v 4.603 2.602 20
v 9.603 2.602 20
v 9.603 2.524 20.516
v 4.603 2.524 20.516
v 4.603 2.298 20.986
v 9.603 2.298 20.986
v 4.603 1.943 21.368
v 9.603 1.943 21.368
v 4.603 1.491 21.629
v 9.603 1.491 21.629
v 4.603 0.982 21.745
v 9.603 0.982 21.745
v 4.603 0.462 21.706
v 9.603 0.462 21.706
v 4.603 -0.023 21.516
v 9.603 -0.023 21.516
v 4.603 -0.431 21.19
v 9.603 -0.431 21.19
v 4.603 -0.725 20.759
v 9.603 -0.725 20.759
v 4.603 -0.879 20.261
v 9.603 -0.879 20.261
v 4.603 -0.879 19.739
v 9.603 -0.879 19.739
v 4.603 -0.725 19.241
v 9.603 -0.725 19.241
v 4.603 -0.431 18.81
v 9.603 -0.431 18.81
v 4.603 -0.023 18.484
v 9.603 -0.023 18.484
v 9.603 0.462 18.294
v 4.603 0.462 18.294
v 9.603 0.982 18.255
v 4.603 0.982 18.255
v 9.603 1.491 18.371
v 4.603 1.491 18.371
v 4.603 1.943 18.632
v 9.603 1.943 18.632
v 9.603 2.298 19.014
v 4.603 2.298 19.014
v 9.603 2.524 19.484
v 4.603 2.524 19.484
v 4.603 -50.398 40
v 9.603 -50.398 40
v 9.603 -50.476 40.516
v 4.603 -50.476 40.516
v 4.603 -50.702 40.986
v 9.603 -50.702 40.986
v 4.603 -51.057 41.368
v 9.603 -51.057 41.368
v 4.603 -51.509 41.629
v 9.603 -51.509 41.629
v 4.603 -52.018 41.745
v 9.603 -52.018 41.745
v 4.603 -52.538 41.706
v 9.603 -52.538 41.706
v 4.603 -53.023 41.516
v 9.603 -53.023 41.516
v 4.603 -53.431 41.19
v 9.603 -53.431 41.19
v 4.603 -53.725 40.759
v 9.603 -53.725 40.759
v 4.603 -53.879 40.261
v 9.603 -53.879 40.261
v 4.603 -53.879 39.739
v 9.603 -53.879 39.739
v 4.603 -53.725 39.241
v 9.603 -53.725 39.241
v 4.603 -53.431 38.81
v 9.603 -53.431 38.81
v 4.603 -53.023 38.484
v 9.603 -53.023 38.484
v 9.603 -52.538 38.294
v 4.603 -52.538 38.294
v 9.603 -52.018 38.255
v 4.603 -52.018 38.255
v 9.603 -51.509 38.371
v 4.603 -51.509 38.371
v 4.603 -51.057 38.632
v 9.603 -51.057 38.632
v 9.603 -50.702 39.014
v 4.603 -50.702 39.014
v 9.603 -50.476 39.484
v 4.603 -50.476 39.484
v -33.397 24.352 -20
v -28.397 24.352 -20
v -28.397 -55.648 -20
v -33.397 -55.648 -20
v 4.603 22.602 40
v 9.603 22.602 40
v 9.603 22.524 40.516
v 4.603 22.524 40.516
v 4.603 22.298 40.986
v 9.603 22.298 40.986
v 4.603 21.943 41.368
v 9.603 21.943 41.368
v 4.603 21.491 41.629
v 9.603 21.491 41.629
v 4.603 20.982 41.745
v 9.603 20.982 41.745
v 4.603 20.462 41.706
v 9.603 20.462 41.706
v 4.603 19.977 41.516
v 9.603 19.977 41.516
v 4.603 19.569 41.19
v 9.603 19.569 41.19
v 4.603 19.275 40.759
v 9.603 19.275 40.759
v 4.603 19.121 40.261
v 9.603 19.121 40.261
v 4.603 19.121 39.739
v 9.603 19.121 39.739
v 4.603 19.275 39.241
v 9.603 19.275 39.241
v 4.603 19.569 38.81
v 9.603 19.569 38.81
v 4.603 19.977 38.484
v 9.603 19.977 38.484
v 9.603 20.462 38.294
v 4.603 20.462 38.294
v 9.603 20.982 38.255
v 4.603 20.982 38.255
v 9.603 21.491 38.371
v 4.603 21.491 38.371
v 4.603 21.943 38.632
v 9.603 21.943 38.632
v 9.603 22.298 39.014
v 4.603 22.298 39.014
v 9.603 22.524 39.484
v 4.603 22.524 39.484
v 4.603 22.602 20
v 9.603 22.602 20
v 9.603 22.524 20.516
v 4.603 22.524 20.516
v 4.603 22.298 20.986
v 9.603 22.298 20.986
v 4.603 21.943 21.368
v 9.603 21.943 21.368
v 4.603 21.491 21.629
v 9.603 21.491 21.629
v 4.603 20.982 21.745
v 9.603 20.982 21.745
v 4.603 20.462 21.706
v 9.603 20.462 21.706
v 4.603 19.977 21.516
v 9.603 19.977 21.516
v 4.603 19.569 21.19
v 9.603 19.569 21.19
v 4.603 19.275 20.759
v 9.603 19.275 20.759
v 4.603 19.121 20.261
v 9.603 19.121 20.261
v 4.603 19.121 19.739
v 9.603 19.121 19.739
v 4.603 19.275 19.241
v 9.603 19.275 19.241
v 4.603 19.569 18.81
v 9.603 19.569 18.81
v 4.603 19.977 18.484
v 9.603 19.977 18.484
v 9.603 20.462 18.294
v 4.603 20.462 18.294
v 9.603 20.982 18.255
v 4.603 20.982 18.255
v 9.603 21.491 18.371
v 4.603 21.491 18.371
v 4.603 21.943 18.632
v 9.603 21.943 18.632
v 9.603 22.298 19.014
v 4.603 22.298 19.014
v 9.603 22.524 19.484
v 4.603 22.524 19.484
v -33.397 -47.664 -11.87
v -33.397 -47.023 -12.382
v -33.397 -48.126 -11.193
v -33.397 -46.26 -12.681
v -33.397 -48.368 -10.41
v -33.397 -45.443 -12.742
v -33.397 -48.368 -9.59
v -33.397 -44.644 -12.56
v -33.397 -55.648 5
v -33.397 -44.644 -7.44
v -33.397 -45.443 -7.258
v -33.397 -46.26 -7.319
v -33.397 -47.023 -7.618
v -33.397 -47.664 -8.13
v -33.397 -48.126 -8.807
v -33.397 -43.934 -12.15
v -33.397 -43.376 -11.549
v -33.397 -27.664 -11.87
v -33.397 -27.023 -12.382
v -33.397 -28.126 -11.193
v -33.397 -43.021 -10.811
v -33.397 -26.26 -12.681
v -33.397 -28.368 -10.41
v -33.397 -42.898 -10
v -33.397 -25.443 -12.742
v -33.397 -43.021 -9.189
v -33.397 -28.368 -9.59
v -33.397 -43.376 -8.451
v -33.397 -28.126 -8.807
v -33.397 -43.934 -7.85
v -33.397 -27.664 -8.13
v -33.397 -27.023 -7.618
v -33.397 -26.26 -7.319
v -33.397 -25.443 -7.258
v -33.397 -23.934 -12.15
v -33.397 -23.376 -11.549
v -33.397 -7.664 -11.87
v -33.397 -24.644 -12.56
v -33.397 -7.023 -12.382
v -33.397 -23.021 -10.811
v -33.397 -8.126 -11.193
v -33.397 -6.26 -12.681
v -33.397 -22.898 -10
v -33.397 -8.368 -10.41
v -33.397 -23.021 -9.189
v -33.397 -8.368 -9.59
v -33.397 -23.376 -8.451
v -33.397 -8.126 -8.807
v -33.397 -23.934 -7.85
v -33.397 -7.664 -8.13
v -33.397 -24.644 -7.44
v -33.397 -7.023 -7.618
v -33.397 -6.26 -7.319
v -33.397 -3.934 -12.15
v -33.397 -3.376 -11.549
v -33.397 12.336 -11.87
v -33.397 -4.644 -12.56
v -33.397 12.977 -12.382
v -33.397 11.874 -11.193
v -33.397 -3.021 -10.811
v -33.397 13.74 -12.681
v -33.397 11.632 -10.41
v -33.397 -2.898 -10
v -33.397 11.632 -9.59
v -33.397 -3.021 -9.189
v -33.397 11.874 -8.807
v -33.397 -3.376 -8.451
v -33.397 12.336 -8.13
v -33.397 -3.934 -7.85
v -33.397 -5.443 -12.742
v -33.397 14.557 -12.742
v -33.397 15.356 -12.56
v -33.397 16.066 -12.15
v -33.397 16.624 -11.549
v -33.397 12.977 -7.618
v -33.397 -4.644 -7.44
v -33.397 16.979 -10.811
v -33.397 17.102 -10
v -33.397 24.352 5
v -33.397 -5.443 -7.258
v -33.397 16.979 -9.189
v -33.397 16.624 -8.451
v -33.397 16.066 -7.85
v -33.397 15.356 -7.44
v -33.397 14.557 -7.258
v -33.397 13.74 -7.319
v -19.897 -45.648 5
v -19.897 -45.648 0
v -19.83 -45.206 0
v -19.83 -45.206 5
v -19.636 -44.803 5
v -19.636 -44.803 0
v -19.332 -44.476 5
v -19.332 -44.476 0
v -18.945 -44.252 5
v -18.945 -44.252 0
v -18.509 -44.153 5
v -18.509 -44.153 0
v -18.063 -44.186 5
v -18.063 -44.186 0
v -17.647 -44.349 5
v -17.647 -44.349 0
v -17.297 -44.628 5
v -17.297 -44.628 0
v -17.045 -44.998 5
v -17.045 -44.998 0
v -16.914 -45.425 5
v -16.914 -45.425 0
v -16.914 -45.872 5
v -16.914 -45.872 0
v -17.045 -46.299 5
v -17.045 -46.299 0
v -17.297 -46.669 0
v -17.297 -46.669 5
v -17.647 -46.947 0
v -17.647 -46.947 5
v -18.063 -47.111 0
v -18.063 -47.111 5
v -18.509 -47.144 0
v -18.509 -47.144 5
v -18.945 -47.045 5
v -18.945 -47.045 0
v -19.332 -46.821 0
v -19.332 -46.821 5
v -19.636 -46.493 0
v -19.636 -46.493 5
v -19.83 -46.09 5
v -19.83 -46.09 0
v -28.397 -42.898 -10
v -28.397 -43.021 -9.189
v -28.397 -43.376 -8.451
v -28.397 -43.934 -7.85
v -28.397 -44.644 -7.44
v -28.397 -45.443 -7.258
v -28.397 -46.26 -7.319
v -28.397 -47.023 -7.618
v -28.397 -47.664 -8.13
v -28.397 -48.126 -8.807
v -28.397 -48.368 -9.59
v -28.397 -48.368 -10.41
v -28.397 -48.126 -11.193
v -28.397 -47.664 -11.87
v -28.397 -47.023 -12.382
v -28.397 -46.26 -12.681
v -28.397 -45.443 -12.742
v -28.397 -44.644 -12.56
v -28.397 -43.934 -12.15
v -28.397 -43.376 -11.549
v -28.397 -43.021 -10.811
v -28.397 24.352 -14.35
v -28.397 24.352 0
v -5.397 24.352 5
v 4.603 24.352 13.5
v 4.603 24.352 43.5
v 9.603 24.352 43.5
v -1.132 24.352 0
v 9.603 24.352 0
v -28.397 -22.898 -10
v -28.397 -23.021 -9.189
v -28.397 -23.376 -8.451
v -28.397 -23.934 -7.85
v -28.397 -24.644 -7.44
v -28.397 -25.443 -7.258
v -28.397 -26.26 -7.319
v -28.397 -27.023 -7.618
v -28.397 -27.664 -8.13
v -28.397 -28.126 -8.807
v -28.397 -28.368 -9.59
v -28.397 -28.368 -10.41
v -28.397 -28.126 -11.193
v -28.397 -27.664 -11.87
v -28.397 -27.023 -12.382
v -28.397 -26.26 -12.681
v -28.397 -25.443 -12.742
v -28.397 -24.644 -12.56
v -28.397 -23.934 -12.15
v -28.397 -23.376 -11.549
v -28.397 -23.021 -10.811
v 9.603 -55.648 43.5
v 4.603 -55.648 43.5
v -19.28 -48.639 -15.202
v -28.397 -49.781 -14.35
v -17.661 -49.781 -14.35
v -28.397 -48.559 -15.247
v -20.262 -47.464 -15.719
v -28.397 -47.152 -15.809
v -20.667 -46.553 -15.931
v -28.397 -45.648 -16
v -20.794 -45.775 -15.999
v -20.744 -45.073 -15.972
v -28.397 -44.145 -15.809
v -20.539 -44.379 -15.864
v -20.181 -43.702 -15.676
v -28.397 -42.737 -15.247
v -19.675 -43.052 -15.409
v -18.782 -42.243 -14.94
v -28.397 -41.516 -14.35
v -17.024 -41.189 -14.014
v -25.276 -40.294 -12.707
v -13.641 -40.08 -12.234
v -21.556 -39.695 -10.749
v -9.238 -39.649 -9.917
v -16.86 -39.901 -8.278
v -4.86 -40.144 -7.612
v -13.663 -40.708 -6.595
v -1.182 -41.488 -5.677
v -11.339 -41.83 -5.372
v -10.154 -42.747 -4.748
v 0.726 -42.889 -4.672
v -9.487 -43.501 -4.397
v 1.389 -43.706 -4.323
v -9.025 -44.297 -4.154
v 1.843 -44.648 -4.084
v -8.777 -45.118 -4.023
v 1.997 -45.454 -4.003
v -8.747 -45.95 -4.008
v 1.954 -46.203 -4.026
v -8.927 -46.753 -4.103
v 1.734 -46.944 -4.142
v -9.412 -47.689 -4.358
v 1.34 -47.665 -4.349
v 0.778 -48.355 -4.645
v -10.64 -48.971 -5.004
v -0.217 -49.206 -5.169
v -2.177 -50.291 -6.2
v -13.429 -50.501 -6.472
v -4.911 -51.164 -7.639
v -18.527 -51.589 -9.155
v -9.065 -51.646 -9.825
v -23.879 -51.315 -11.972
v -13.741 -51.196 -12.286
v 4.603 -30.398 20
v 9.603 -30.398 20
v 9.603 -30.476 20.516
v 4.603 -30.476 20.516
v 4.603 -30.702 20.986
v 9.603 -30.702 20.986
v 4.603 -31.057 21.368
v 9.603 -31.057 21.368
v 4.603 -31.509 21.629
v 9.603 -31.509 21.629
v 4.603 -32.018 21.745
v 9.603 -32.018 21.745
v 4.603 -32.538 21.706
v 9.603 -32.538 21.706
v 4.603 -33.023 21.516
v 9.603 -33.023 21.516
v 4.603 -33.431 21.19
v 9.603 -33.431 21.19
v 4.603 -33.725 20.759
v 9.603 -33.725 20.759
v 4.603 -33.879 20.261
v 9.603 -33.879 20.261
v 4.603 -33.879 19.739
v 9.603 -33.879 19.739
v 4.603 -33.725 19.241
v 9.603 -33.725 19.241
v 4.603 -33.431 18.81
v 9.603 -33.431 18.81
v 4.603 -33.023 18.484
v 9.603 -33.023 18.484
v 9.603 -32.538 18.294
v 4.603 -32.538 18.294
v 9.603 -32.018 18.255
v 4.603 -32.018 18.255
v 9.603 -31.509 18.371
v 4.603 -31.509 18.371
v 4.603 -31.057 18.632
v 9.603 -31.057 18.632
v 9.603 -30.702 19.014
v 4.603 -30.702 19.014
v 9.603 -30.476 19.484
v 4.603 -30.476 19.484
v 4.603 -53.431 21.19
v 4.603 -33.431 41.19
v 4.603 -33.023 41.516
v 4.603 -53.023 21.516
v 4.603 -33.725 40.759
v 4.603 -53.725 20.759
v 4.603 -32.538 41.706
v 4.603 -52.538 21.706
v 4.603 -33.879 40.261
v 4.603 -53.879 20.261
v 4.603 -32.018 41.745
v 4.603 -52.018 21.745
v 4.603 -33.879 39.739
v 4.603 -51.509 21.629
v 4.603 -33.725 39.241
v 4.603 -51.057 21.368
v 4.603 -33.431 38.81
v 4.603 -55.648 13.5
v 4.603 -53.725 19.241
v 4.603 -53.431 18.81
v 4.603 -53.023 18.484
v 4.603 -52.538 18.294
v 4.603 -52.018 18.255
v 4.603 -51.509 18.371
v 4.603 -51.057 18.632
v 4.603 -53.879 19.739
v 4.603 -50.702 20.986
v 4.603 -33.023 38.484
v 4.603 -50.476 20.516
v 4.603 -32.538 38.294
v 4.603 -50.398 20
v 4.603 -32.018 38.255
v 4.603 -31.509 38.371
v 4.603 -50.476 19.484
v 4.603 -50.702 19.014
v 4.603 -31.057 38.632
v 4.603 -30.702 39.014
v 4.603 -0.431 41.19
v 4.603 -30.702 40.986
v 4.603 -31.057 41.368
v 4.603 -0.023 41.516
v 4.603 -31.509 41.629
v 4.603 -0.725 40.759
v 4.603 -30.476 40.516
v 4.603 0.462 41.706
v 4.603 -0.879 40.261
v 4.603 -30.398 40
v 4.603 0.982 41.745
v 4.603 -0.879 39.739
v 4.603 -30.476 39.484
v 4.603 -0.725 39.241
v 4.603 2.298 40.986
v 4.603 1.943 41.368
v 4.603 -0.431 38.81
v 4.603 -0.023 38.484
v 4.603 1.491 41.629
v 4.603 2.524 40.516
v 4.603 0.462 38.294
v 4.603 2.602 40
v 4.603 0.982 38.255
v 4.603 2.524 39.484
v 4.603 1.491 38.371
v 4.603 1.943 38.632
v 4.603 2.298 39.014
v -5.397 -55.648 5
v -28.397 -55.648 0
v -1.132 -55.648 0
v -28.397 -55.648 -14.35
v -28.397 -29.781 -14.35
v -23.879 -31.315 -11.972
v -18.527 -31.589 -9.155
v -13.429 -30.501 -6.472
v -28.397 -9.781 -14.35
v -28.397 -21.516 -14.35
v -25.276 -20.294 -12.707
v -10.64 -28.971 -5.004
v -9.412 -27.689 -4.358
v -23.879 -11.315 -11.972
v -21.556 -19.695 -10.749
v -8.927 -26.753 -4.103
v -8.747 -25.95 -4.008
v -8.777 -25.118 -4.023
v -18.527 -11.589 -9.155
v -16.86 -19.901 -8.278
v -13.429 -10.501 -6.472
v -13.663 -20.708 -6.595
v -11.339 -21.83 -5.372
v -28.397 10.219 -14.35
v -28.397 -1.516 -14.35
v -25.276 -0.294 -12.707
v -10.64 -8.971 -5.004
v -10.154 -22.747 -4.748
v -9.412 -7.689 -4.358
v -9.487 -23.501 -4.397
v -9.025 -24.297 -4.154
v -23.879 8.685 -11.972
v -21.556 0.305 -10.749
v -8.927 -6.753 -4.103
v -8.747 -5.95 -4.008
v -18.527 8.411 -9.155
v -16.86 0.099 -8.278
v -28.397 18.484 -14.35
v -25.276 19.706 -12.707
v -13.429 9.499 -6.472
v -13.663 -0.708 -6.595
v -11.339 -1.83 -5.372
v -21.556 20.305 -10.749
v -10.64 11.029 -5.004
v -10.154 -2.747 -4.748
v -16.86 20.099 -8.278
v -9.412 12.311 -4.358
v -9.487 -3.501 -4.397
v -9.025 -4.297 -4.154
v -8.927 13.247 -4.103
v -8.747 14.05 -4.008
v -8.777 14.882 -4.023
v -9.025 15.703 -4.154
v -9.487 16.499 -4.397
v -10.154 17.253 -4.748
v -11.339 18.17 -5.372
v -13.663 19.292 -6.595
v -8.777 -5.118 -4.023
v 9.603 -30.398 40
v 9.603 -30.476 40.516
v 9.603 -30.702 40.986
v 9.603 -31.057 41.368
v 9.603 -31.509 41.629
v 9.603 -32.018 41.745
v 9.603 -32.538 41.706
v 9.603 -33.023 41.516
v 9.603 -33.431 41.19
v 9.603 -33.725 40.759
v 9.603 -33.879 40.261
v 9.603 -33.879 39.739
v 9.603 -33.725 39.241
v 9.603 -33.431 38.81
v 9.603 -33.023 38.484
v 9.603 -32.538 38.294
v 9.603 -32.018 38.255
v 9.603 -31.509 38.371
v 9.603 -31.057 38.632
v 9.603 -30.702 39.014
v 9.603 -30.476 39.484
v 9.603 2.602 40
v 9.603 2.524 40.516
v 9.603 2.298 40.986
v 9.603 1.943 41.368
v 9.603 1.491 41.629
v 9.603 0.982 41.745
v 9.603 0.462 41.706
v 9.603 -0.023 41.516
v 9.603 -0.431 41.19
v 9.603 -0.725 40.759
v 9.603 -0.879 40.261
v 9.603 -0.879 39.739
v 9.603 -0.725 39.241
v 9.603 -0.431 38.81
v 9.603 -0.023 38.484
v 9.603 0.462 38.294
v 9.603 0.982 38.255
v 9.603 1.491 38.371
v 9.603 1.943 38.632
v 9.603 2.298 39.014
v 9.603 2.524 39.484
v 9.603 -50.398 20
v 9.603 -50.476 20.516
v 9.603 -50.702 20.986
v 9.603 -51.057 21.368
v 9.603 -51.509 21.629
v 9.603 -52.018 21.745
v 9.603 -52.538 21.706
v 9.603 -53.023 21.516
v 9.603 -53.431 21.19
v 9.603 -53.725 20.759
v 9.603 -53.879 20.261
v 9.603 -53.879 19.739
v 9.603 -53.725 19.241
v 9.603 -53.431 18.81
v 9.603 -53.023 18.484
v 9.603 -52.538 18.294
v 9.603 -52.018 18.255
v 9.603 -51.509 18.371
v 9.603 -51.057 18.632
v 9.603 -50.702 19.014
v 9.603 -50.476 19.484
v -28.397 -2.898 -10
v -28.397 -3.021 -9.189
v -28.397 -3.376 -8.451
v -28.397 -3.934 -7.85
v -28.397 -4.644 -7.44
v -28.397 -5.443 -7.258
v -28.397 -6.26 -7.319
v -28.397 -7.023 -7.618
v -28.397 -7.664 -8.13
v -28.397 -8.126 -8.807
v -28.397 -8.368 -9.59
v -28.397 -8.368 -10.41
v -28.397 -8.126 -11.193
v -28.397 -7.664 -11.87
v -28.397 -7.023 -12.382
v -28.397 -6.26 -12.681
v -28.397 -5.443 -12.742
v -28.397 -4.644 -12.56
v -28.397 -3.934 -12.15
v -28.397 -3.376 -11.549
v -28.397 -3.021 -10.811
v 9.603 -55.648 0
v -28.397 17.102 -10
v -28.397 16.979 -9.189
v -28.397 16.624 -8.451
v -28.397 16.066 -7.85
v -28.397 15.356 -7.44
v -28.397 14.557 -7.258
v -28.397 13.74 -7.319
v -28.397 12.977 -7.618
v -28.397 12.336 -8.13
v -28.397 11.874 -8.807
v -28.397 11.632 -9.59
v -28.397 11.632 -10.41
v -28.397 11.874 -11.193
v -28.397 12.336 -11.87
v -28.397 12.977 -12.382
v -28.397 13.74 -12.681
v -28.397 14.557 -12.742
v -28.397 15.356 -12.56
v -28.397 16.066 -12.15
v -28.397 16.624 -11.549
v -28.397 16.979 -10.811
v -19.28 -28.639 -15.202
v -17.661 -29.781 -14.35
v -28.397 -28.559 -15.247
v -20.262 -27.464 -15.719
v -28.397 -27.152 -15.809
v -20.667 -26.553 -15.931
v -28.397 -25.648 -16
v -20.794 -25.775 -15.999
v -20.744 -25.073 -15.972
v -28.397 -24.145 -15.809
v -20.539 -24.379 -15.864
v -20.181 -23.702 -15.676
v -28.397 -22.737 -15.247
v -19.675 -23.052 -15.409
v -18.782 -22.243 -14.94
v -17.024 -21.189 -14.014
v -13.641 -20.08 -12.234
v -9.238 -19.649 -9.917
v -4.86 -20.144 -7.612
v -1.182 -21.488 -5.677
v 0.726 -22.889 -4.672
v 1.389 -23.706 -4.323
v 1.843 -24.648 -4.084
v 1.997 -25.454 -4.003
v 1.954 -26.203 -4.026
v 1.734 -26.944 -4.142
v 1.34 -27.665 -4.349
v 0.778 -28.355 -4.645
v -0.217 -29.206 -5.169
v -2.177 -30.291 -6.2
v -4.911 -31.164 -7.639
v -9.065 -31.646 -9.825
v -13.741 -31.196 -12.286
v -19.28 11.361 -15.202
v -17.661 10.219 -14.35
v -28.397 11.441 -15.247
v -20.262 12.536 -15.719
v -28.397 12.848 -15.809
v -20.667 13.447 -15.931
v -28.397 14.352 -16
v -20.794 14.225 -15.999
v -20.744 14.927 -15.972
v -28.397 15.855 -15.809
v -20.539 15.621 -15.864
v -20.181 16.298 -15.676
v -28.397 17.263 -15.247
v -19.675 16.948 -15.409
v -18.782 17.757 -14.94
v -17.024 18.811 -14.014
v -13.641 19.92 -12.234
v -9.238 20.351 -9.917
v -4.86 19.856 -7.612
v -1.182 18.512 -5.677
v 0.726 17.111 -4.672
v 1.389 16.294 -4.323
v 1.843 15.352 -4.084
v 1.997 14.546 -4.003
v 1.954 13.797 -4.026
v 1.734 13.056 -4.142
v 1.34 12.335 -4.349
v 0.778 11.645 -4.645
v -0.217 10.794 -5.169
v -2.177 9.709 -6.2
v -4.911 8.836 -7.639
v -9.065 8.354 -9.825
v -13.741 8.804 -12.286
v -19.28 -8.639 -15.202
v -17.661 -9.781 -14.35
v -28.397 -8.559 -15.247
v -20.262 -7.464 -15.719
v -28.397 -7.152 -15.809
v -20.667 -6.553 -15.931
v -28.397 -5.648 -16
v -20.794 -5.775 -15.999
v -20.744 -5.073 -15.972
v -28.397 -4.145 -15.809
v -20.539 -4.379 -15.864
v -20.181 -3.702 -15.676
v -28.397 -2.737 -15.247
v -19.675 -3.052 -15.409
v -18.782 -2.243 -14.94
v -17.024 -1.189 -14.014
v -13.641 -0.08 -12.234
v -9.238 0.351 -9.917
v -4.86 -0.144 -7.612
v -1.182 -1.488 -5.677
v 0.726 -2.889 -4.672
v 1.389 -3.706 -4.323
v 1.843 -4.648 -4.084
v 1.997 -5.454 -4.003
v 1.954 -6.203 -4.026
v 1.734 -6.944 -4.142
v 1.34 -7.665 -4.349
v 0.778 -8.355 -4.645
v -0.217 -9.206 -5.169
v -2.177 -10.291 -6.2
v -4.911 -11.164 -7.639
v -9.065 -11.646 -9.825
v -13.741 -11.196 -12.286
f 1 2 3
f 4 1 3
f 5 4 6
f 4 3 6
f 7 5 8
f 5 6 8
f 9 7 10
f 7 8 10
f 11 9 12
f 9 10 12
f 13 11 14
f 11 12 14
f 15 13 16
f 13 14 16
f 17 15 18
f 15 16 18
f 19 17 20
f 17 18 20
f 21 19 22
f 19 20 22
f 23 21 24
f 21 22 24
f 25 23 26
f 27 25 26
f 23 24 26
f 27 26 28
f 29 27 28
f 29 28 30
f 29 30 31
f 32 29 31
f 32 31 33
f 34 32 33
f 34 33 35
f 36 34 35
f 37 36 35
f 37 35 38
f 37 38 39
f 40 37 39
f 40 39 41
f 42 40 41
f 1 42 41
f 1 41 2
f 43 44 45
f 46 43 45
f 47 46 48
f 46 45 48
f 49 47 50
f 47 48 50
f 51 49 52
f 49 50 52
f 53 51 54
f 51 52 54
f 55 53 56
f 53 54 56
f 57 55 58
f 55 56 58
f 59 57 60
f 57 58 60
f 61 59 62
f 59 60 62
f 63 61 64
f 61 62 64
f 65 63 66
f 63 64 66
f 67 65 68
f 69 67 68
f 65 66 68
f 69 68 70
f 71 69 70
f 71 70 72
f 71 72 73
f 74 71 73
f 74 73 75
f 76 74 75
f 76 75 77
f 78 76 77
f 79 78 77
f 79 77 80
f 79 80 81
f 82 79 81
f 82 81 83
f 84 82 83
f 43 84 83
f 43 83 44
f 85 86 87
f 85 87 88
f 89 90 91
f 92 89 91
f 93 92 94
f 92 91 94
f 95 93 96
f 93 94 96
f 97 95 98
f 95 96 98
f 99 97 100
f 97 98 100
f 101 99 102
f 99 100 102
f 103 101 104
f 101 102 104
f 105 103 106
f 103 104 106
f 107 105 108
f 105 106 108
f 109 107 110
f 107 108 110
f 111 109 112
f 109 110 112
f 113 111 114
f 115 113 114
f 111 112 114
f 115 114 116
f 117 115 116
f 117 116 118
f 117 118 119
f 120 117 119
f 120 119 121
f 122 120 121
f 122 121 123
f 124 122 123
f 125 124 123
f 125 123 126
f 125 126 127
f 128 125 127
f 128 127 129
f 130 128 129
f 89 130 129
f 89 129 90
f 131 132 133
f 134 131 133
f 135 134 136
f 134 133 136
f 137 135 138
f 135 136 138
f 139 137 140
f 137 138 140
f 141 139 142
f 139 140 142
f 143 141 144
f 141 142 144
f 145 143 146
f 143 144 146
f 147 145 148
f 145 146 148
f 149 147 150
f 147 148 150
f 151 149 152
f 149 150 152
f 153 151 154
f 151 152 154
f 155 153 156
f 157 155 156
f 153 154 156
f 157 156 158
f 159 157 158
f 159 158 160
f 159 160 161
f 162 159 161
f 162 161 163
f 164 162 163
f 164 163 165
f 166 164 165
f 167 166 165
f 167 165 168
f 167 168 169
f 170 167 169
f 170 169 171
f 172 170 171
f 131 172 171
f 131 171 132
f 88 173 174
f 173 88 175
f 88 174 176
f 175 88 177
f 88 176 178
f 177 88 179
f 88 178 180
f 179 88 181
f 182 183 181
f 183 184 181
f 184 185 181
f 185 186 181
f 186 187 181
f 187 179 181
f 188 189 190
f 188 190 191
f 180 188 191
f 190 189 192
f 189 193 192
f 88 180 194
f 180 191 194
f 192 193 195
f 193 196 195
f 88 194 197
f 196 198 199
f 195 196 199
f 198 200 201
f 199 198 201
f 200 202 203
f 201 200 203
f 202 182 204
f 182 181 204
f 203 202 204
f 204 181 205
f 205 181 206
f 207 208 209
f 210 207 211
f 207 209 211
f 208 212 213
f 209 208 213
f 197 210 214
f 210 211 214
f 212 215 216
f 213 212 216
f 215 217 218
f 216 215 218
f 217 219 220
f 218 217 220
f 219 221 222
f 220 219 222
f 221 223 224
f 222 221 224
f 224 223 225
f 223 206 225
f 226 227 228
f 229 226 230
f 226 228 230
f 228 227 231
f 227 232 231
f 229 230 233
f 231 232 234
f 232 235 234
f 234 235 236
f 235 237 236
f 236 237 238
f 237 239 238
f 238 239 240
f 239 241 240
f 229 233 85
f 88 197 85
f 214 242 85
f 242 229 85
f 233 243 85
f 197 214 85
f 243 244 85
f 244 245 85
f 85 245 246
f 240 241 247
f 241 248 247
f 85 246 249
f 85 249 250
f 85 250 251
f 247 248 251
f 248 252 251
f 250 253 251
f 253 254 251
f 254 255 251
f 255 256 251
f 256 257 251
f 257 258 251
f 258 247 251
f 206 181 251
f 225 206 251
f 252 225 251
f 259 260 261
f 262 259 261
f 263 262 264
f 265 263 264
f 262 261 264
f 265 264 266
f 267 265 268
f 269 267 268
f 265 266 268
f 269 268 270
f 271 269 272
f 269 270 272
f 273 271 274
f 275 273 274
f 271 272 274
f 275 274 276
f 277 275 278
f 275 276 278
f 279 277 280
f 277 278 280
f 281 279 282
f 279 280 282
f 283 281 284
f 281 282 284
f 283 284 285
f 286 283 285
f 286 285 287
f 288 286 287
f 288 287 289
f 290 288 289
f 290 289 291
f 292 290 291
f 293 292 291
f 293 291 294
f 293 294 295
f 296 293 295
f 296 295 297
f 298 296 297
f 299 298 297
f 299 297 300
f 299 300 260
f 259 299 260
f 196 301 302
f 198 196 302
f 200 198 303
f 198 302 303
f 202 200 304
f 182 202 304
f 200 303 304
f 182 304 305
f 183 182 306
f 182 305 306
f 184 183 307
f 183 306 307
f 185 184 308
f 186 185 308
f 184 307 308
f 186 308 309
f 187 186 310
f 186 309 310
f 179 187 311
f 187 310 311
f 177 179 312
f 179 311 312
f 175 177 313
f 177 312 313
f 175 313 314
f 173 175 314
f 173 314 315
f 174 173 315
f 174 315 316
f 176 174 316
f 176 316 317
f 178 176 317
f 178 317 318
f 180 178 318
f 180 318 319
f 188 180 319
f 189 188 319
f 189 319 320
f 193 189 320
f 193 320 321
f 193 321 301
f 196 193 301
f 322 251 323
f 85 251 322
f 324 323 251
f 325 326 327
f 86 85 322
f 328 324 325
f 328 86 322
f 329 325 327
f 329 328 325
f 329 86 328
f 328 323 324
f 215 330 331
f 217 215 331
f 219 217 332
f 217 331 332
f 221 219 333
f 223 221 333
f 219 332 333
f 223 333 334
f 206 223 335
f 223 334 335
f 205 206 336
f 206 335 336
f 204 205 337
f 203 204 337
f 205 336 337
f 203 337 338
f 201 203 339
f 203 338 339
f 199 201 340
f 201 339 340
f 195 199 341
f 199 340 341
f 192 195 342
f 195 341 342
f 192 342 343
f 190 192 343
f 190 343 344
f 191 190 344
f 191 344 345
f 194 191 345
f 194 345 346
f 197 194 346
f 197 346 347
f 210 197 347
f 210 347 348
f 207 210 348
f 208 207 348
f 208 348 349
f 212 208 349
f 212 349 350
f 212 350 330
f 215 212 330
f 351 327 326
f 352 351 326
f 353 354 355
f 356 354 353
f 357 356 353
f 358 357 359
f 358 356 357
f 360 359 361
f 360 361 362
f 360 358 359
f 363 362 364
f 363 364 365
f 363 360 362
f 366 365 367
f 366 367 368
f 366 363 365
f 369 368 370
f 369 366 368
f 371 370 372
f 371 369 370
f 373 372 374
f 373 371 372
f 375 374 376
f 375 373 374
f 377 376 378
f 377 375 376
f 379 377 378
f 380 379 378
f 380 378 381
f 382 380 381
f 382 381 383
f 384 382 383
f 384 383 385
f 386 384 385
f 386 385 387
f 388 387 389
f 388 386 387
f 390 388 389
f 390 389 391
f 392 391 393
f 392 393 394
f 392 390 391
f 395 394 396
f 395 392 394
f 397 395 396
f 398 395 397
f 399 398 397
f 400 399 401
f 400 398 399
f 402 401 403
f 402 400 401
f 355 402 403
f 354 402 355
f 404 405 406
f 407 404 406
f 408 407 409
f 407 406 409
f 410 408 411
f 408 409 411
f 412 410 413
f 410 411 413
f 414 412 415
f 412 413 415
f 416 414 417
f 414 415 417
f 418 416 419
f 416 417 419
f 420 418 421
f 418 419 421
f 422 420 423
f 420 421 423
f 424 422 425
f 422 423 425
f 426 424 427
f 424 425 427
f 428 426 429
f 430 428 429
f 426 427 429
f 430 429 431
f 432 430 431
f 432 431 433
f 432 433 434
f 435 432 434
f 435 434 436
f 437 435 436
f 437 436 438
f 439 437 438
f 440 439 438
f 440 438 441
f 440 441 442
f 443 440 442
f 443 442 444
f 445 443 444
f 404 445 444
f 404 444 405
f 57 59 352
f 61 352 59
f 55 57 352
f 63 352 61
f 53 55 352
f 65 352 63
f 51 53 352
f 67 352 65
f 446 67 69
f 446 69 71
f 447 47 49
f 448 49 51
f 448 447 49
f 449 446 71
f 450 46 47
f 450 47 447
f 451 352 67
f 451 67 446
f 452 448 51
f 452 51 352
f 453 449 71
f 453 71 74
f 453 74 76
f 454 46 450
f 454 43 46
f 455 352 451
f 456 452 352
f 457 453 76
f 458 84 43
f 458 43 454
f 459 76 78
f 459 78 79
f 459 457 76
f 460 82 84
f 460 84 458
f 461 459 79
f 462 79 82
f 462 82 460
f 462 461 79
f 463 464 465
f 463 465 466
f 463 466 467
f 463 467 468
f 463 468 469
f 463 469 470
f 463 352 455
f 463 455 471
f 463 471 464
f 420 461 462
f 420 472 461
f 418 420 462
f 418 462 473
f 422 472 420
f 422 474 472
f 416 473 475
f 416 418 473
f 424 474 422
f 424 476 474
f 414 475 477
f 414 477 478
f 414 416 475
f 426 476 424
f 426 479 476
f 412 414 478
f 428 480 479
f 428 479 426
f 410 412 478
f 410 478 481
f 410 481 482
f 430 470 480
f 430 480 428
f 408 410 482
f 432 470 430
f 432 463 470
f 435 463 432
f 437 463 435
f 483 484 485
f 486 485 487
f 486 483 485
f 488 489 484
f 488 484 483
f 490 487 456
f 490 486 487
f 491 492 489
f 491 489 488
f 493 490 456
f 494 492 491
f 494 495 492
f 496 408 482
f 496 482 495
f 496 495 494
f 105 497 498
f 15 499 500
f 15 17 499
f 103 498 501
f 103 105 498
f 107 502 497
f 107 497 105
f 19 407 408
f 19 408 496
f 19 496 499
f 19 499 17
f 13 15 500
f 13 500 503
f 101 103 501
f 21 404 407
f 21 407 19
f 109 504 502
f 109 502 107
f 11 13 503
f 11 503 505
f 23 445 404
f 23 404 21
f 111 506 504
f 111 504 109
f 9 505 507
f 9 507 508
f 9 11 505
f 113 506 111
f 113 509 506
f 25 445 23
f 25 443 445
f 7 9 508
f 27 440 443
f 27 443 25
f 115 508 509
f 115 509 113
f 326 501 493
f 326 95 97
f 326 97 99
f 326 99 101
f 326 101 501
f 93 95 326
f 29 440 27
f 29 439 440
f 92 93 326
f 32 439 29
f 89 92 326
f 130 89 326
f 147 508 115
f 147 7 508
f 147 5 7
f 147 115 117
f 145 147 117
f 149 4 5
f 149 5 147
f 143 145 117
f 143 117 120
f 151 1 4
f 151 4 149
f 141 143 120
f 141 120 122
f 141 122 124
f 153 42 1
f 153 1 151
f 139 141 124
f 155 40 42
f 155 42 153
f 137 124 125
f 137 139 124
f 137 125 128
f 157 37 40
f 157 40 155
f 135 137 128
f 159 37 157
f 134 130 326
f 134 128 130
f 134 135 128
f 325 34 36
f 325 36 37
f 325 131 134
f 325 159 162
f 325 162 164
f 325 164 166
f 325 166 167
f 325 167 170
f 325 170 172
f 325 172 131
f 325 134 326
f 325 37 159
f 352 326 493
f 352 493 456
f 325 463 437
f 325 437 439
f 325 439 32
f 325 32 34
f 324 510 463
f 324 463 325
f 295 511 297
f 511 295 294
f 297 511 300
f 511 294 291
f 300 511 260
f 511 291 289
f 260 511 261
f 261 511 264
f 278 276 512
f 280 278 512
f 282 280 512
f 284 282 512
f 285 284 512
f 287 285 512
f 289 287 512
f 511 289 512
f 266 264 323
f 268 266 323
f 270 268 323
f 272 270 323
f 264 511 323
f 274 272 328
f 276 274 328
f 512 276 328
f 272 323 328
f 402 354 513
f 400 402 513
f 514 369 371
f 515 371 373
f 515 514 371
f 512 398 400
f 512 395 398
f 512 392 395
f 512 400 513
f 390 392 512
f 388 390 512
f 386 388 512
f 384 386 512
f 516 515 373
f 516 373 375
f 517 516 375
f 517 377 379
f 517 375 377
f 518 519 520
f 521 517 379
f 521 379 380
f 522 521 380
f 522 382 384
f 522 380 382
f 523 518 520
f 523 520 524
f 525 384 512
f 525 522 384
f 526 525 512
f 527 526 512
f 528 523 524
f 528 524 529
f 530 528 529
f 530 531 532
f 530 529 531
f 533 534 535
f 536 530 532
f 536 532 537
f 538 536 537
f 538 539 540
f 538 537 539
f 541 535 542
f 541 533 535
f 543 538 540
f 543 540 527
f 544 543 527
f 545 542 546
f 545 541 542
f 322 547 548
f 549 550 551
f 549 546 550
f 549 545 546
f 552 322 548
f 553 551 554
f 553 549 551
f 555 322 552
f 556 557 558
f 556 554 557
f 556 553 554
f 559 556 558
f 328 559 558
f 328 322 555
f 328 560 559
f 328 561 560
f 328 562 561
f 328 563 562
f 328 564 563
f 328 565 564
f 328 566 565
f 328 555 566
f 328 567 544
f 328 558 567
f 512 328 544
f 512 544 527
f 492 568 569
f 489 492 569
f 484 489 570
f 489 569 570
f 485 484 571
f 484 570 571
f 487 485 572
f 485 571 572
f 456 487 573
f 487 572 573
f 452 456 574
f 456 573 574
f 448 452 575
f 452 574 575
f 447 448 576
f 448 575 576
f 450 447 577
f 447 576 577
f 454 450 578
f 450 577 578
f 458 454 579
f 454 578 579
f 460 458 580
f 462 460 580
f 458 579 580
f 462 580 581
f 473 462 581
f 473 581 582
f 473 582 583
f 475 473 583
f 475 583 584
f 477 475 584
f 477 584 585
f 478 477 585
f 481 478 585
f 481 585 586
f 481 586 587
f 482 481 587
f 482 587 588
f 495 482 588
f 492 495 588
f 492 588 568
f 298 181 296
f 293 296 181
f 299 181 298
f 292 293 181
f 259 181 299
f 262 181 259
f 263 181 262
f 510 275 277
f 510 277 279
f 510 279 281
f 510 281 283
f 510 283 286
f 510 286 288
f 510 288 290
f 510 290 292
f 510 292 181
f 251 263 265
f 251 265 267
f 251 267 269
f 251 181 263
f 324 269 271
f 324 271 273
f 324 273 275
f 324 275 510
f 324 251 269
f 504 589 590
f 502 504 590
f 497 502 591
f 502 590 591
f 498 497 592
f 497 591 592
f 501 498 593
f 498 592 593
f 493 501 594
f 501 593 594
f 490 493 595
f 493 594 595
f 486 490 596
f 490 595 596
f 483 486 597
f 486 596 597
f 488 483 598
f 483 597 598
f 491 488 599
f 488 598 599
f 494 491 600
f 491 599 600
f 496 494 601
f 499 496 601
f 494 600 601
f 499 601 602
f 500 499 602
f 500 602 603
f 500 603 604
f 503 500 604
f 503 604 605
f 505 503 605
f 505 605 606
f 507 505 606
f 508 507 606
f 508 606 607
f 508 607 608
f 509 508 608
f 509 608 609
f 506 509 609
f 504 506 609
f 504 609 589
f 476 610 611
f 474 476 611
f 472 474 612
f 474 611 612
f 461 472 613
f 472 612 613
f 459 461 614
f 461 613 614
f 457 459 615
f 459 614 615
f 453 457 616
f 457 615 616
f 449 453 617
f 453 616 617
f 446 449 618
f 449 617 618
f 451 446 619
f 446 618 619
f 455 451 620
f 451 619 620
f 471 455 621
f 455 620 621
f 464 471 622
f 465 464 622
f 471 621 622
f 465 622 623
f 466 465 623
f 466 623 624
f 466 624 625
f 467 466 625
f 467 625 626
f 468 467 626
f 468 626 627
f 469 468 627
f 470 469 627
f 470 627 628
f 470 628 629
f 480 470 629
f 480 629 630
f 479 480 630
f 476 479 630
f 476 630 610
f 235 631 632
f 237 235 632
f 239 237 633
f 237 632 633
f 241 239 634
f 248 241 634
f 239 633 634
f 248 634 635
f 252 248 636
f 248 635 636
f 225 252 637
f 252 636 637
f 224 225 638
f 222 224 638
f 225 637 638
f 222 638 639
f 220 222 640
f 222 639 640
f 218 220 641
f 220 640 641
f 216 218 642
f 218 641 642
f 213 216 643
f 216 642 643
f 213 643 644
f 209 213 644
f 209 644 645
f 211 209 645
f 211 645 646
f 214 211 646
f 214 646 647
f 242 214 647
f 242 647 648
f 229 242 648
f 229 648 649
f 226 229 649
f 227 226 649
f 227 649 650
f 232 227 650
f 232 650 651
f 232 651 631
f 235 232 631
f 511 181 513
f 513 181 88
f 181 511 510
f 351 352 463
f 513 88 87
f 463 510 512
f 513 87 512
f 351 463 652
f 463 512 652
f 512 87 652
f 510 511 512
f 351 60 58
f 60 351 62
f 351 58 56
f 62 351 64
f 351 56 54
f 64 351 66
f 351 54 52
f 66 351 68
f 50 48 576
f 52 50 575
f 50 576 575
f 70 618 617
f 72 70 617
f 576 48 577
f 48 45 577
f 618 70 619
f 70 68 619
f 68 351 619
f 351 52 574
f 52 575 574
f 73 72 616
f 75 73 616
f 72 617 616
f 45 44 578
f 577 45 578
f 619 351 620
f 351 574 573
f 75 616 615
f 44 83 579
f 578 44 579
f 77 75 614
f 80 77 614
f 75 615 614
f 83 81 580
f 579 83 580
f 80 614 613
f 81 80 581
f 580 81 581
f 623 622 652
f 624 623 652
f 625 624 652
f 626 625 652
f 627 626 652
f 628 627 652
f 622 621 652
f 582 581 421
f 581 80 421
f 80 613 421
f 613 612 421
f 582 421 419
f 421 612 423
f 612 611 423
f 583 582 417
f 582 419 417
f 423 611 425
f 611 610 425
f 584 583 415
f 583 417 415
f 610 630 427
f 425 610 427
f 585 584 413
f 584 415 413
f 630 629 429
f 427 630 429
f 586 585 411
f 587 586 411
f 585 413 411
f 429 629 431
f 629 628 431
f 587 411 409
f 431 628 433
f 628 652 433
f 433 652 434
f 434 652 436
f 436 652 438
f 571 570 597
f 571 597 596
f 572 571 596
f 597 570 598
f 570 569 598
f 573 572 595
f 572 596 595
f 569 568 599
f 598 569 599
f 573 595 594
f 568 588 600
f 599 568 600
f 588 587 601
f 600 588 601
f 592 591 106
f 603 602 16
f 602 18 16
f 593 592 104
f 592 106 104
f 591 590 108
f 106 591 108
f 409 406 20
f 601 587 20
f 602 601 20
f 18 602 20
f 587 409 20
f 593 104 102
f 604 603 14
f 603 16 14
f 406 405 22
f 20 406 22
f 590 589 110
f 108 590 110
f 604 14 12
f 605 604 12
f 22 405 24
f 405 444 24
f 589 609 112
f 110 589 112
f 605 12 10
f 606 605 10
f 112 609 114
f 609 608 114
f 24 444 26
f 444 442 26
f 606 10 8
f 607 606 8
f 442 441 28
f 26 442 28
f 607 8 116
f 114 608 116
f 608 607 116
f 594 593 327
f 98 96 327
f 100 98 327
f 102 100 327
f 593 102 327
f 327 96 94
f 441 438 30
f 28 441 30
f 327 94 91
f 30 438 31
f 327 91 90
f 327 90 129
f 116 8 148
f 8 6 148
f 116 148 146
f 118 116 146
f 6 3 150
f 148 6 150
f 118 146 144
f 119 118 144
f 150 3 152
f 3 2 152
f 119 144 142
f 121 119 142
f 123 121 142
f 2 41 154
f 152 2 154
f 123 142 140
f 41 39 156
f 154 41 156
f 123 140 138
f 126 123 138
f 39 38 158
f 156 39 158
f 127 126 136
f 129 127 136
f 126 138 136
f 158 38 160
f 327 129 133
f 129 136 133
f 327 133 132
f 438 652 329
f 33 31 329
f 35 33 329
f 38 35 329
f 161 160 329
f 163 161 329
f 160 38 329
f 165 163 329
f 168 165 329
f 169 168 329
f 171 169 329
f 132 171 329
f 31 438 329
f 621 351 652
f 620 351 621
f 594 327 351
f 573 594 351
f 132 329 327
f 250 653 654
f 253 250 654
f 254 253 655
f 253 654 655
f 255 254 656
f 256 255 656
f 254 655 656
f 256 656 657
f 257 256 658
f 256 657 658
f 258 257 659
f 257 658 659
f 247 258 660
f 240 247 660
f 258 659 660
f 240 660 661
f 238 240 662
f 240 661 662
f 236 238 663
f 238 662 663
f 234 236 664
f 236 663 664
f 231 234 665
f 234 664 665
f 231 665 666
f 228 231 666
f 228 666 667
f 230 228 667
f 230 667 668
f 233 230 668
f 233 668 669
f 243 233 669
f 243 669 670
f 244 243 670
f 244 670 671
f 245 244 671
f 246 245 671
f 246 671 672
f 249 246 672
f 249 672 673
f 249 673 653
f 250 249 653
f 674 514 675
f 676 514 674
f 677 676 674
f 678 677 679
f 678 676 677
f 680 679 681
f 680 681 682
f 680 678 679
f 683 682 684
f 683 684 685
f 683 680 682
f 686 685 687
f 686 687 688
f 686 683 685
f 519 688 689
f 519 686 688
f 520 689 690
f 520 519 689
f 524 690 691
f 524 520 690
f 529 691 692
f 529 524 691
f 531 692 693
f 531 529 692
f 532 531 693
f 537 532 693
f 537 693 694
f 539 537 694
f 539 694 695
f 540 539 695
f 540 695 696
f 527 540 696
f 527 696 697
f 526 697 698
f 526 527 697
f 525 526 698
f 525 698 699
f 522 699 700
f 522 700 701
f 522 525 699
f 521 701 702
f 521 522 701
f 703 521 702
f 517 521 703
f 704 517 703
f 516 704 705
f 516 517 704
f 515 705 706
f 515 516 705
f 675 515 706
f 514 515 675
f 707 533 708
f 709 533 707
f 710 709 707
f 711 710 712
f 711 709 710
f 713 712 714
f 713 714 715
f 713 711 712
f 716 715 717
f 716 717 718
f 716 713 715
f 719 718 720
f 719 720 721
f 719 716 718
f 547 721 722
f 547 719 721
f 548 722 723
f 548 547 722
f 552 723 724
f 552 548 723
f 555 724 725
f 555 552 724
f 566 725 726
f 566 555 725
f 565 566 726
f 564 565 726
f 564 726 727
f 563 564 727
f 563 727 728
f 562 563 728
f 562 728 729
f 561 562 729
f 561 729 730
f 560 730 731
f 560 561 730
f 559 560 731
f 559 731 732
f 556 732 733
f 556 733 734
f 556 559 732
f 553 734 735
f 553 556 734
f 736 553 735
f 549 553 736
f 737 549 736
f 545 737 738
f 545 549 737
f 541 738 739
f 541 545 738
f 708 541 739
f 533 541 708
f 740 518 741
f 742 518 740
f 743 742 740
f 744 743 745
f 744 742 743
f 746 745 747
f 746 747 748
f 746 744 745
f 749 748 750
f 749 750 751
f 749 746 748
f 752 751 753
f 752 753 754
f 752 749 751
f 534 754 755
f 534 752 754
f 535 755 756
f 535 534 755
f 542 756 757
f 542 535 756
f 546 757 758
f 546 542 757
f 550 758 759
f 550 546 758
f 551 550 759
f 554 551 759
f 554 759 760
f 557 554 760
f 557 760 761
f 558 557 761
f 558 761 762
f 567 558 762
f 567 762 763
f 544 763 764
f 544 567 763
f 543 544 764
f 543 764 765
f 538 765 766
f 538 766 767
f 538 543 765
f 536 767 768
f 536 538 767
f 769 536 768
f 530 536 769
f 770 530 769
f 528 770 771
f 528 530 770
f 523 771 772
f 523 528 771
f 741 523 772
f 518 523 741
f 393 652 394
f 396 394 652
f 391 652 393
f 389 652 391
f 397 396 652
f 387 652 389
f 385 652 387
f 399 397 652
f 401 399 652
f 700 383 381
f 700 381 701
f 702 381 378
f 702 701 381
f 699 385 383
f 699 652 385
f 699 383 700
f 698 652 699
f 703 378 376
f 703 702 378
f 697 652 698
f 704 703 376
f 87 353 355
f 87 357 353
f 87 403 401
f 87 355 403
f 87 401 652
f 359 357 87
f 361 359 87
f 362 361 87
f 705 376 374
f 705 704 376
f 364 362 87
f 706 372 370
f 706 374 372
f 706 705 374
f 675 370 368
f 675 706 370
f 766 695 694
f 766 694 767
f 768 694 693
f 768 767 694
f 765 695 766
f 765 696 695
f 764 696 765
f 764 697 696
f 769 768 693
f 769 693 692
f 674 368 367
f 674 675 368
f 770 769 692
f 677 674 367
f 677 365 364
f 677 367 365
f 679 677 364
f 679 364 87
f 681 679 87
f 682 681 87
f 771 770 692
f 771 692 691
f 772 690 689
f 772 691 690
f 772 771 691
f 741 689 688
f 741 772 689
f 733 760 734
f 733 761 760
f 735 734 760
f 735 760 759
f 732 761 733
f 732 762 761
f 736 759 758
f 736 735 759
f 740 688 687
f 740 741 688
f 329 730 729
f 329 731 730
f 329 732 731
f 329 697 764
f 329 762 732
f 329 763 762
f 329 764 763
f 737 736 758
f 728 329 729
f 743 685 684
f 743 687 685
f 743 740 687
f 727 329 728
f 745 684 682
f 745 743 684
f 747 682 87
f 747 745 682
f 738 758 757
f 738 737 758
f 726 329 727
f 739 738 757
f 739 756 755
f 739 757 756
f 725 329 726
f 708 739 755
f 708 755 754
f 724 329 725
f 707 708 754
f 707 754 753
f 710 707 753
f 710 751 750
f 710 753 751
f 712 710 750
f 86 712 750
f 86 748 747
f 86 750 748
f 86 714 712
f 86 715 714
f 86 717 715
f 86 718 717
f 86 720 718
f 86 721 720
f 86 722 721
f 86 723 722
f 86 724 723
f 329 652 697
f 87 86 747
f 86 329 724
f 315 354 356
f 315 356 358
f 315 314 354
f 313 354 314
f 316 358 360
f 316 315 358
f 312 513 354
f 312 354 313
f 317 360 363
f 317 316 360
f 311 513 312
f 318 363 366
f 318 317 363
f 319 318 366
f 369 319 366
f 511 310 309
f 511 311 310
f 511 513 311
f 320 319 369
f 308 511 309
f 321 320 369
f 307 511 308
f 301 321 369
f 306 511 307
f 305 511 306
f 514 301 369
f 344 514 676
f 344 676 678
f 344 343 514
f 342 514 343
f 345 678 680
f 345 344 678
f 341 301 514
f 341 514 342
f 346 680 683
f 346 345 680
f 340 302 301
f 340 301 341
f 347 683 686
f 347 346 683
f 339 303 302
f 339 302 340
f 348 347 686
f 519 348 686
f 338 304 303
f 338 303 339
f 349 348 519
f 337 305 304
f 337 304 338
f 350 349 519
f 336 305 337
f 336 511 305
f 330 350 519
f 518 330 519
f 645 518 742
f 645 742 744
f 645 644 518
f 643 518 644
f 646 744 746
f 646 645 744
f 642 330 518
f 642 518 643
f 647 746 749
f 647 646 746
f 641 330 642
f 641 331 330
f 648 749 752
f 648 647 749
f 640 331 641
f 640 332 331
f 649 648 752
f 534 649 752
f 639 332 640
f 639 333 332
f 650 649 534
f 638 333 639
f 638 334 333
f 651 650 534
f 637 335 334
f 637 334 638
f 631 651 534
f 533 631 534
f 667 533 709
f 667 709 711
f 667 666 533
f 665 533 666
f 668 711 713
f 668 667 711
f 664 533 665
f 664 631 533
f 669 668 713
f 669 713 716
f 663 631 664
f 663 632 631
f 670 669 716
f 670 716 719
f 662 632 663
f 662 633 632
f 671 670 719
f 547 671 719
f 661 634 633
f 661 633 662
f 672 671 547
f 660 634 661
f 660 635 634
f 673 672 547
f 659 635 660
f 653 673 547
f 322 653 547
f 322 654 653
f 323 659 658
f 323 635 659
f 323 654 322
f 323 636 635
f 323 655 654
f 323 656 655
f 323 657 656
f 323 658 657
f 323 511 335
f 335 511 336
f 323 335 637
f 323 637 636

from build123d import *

# Parameters (mm, degrees)
ESQUISSE1_W             = 43
ESQUISSE1_H             = 80
BOSS_EXTRU_1_DEPTH      = 5
ESQUISSE2_W             = 5
ESQUISSE2_H             = 80
BOSS_EXTRU_2_DEPTH      = 38.5
ENL_V_MAT_EXTRU_1_REACH = 84.692
ESQUISSE3_R             = 1.75
ESQUISSE4_W             = 5
ESQUISSE4_H             = 80
BOSS_EXTRU_3_DEPTH      = 20
ENL_V_MAT_EXTRU_2_REACH = 82.206
ESQUISSE5_R             = 2.75
ENL_V_MAT_EXTRU_3_REACH = 80.13
ESQUISSE6_R             = 1.5
BOSS_EXTRU_4_DEPTH      = 80
ENL_V_MAT_EXTRU_4_REACH = 82.206
ESQUISSE8_R             = 6
CHANFREIN2_SIZE         = 8.5
CHANFREIN2_SIZE2        = 10


with BuildPart() as part:
    # Esquisse1 → Boss.-Extru.1 (new body)
    with BuildSketch(Plane.XY):
        with Locations((-11.896872358, -15.648351648)):
            Rectangle(ESQUISSE1_W, ESQUISSE1_H)
    extrude(amount=BOSS_EXTRU_1_DEPTH)

    # Esquisse2 → Boss.-Extru.2 (add)
    with BuildSketch(Plane(origin=(0, 0, 5), x_dir=(-1, 0, 0), z_dir=(0, 0, -1))):
        with Locations((-7.103127642, -15.648351648)):
            Rectangle(ESQUISSE2_W, ESQUISSE2_H)
    extrude(amount=-BOSS_EXTRU_2_DEPTH)

    # Esquisse3 → Enlèv. mat.-Extru.1 (cut, up to next)
    with BuildSketch(Plane(origin=(9.603127642, 0, 0), x_dir=(0, 0, -1), z_dir=(1, 0, 0)), mode=Mode.PRIVATE) as enl_v_mat_extru_1_sk1:
        with Locations(Location((-40, -52.148351648, 0), (0, 0, 90))):
            Circle(ESQUISSE3_R)
    enl_v_mat_extru_1_tool1 = extrude(enl_v_mat_extru_1_sk1.sketch, amount=-ENL_V_MAT_EXTRU_1_REACH, mode=Mode.PRIVATE) & part.part
    # Esquisse3 → Enlèv. mat.-Extru.1 (cut, up to next)
    with BuildSketch(Plane(origin=(9.603127642, 0, 0), x_dir=(0, 0, -1), z_dir=(1, 0, 0)), mode=Mode.PRIVATE) as enl_v_mat_extru_1_sk2:
        with Locations(Location((-40, -32.148351648, 0), (0, 0, 90))):
            Circle(ESQUISSE3_R)
    enl_v_mat_extru_1_tool2 = extrude(enl_v_mat_extru_1_sk2.sketch, amount=-ENL_V_MAT_EXTRU_1_REACH, mode=Mode.PRIVATE) & part.part
    # Esquisse3 → Enlèv. mat.-Extru.1 (cut, up to next)
    with BuildSketch(Plane(origin=(9.603127642, 0, 0), x_dir=(0, 0, -1), z_dir=(1, 0, 0)), mode=Mode.PRIVATE) as enl_v_mat_extru_1_sk3:
        with Locations(Location((-20, -32.148351648, 0), (0, 0, 90))):
            Circle(ESQUISSE3_R)
    enl_v_mat_extru_1_tool3 = extrude(enl_v_mat_extru_1_sk3.sketch, amount=-ENL_V_MAT_EXTRU_1_REACH, mode=Mode.PRIVATE) & part.part
    # Esquisse3 → Enlèv. mat.-Extru.1 (cut, up to next)
    with BuildSketch(Plane(origin=(9.603127642, 0, 0), x_dir=(0, 0, -1), z_dir=(1, 0, 0)), mode=Mode.PRIVATE) as enl_v_mat_extru_1_sk4:
        with Locations(Location((-20, -52.148351648, 0), (0, 0, 90))):
            Circle(ESQUISSE3_R)
    enl_v_mat_extru_1_tool4 = extrude(enl_v_mat_extru_1_sk4.sketch, amount=-ENL_V_MAT_EXTRU_1_REACH, mode=Mode.PRIVATE) & part.part
    # Esquisse3 → Enlèv. mat.-Extru.1 (cut, up to next)
    with BuildSketch(Plane(origin=(9.603127642, 0, 0), x_dir=(0, 0, -1), z_dir=(1, 0, 0)), mode=Mode.PRIVATE) as enl_v_mat_extru_1_sk5:
        with Locations(Location((-40, 0.851648352, 0), (0, 0, 90))):
            Circle(ESQUISSE3_R)
    enl_v_mat_extru_1_tool5 = extrude(enl_v_mat_extru_1_sk5.sketch, amount=-ENL_V_MAT_EXTRU_1_REACH, mode=Mode.PRIVATE) & part.part
    # Esquisse3 → Enlèv. mat.-Extru.1 (cut, up to next)
    with BuildSketch(Plane(origin=(9.603127642, 0, 0), x_dir=(0, 0, -1), z_dir=(1, 0, 0)), mode=Mode.PRIVATE) as enl_v_mat_extru_1_sk6:
        with Locations(Location((-40, 20.851648352, 0), (0, 0, 90))):
            Circle(ESQUISSE3_R)
    enl_v_mat_extru_1_tool6 = extrude(enl_v_mat_extru_1_sk6.sketch, amount=-ENL_V_MAT_EXTRU_1_REACH, mode=Mode.PRIVATE) & part.part
    # Esquisse3 → Enlèv. mat.-Extru.1 (cut, up to next)
    with BuildSketch(Plane(origin=(9.603127642, 0, 0), x_dir=(0, 0, -1), z_dir=(1, 0, 0)), mode=Mode.PRIVATE) as enl_v_mat_extru_1_sk7:
        with Locations(Location((-20, 20.851648352, 0), (0, 0, 90))):
            Circle(ESQUISSE3_R)
    enl_v_mat_extru_1_tool7 = extrude(enl_v_mat_extru_1_sk7.sketch, amount=-ENL_V_MAT_EXTRU_1_REACH, mode=Mode.PRIVATE) & part.part
    # Esquisse3 → Enlèv. mat.-Extru.1 (cut, up to next)
    with BuildSketch(Plane(origin=(9.603127642, 0, 0), x_dir=(0, 0, -1), z_dir=(1, 0, 0)), mode=Mode.PRIVATE) as enl_v_mat_extru_1_sk8:
        with Locations(Location((-20, 0.851648352, 0), (0, 0, 90))):
            Circle(ESQUISSE3_R)
    enl_v_mat_extru_1_tool8 = extrude(enl_v_mat_extru_1_sk8.sketch, amount=-ENL_V_MAT_EXTRU_1_REACH, mode=Mode.PRIVATE) & part.part
    add(enl_v_mat_extru_1_tool1.solids().sort_by_distance((9.603128, -52.148352, 40))[0], mode=Mode.SUBTRACT)
    add(enl_v_mat_extru_1_tool2.solids().sort_by_distance((9.603128, -32.148352, 40))[0], mode=Mode.SUBTRACT)
    add(enl_v_mat_extru_1_tool3.solids().sort_by_distance((9.603128, -32.148352, 20))[0], mode=Mode.SUBTRACT)
    add(enl_v_mat_extru_1_tool4.solids().sort_by_distance((9.603128, -52.148352, 20))[0], mode=Mode.SUBTRACT)
    add(enl_v_mat_extru_1_tool5.solids().sort_by_distance((9.603128, 0.851648, 40))[0], mode=Mode.SUBTRACT)
    add(enl_v_mat_extru_1_tool6.solids().sort_by_distance((9.603128, 20.851648, 40))[0], mode=Mode.SUBTRACT)
    add(enl_v_mat_extru_1_tool7.solids().sort_by_distance((9.603128, 20.851648, 20))[0], mode=Mode.SUBTRACT)
    add(enl_v_mat_extru_1_tool8.solids().sort_by_distance((9.603128, 0.851648, 20))[0], mode=Mode.SUBTRACT)

    # Esquisse4 → Boss.-Extru.3 (add)
    with BuildSketch(Plane(origin=(0, 0, 0), x_dir=(-1, 0, 0), z_dir=(0, 0, -1))):
        with Locations((30.896872358, -15.648351648)):
            Rectangle(ESQUISSE4_W, ESQUISSE4_H)
    extrude(amount=BOSS_EXTRU_3_DEPTH)

    # Esquisse5 → Enlèv. mat.-Extru.2 (cut, up to next)
    with BuildSketch(Plane(origin=(-28.396872358, 0, 0), x_dir=(0, 0, -1), z_dir=(1, 0, 0)), mode=Mode.PRIVATE) as enl_v_mat_extru_2_sk1:
        with Locations(Location((10, 14.351648352, 0), (0, 0, 90))):
            Circle(ESQUISSE5_R)
    enl_v_mat_extru_2_tool1 = extrude(enl_v_mat_extru_2_sk1.sketch, amount=-ENL_V_MAT_EXTRU_2_REACH, mode=Mode.PRIVATE) & part.part
    # Esquisse5 → Enlèv. mat.-Extru.2 (cut, up to next)
    with BuildSketch(Plane(origin=(-28.396872358, 0, 0), x_dir=(0, 0, -1), z_dir=(1, 0, 0)), mode=Mode.PRIVATE) as enl_v_mat_extru_2_sk2:
        with Locations(Location((10, -5.648351648, 0), (0, 0, 90))):
            Circle(ESQUISSE5_R)
    enl_v_mat_extru_2_tool2 = extrude(enl_v_mat_extru_2_sk2.sketch, amount=-ENL_V_MAT_EXTRU_2_REACH, mode=Mode.PRIVATE) & part.part
    # Esquisse5 → Enlèv. mat.-Extru.2 (cut, up to next)
    with BuildSketch(Plane(origin=(-28.396872358, 0, 0), x_dir=(0, 0, -1), z_dir=(1, 0, 0)), mode=Mode.PRIVATE) as enl_v_mat_extru_2_sk3:
        with Locations(Location((10, -25.648351648, 0), (0, 0, 90))):
            Circle(ESQUISSE5_R)
    enl_v_mat_extru_2_tool3 = extrude(enl_v_mat_extru_2_sk3.sketch, amount=-ENL_V_MAT_EXTRU_2_REACH, mode=Mode.PRIVATE) & part.part
    # Esquisse5 → Enlèv. mat.-Extru.2 (cut, up to next)
    with BuildSketch(Plane(origin=(-28.396872358, 0, 0), x_dir=(0, 0, -1), z_dir=(1, 0, 0)), mode=Mode.PRIVATE) as enl_v_mat_extru_2_sk4:
        with Locations(Location((10, -45.648351648, 0), (0, 0, 90))):
            Circle(ESQUISSE5_R)
    enl_v_mat_extru_2_tool4 = extrude(enl_v_mat_extru_2_sk4.sketch, amount=-ENL_V_MAT_EXTRU_2_REACH, mode=Mode.PRIVATE) & part.part
    add(enl_v_mat_extru_2_tool1.solids().sort_by_distance((-28.396872, 14.351648, -10))[0], mode=Mode.SUBTRACT)
    add(enl_v_mat_extru_2_tool2.solids().sort_by_distance((-28.396872, -5.648352, -10))[0], mode=Mode.SUBTRACT)
    add(enl_v_mat_extru_2_tool3.solids().sort_by_distance((-28.396872, -25.648352, -10))[0], mode=Mode.SUBTRACT)
    add(enl_v_mat_extru_2_tool4.solids().sort_by_distance((-28.396872, -45.648352, -10))[0], mode=Mode.SUBTRACT)

    # Esquisse6 → Enlèv. mat.-Extru.3 (cut, up to next)
    with BuildSketch(Plane(origin=(0, 0, 0), x_dir=(-1, 0, 0), z_dir=(0, 0, -1)), mode=Mode.PRIVATE) as enl_v_mat_extru_3_sk1:
        with Locations((18.396872358, -45.648351648)):
            Circle(ESQUISSE6_R)
    enl_v_mat_extru_3_tool1 = extrude(enl_v_mat_extru_3_sk1.sketch, amount=-ENL_V_MAT_EXTRU_3_REACH, mode=Mode.PRIVATE) & part.part
    add(enl_v_mat_extru_3_tool1.solids().sort_by_distance((-18.396872, -45.648352, 0))[0], mode=Mode.SUBTRACT)

    # Esquisse7 → Boss.-Extru.4 (add)
    with BuildSketch(Plane(origin=(0, 24.351648352, 0), x_dir=(1, 0, 0), z_dir=(0, 1, 0))):
        Polygon((9.603127642, 0), (-28.396872358, 20), (-28.396872358, 14.349760381), (-1.132327635, 0), align=None)
    extrude(amount=-BOSS_EXTRU_4_DEPTH)

    # Enlèv. mat.-Extru.4: up to this plane
    enl_v_mat_extru_4_end = Plane(origin=(9.603127642, -98.590172756, 0), z_dir=(0.46574643283262246, 0, -0.8849182223819824))
    # Esquisse8 → Enlèv. mat.-Extru.4 (cut, up to the surface)
    with BuildSketch(Plane(origin=(-28.396872358, 0, 0), x_dir=(0, 0, -1), z_dir=(1, 0, 0)), mode=Mode.PRIVATE) as enl_v_mat_extru_4_sk1:
        with Locations(Location((10, -45.648351648, 0), (0, 0, 316.465525683))):
            Circle(ESQUISSE8_R)
    enl_v_mat_extru_4_tool1 = split(extrude(enl_v_mat_extru_4_sk1.sketch, amount=ENL_V_MAT_EXTRU_4_REACH, mode=Mode.PRIVATE), bisect_by=enl_v_mat_extru_4_end, keep=Keep.BOTH, mode=Mode.PRIVATE)
    add(enl_v_mat_extru_4_tool1.solids().sort_by_distance((-28.396872, -45.648352, -10))[0], mode=Mode.SUBTRACT)
    # Esquisse8 → Enlèv. mat.-Extru.4 (cut, up to the surface)
    with BuildSketch(Plane(origin=(-28.396872358, 0, 0), x_dir=(0, 0, -1), z_dir=(1, 0, 0)), mode=Mode.PRIVATE) as enl_v_mat_extru_4_sk2:
        with Locations(Location((10, -25.648351648, 0), (0, 0, 316.465525683))):
            Circle(ESQUISSE8_R)
    enl_v_mat_extru_4_tool2 = split(extrude(enl_v_mat_extru_4_sk2.sketch, amount=ENL_V_MAT_EXTRU_4_REACH, mode=Mode.PRIVATE), bisect_by=enl_v_mat_extru_4_end, keep=Keep.BOTH, mode=Mode.PRIVATE)
    add(enl_v_mat_extru_4_tool2.solids().sort_by_distance((-28.396872, -25.648352, -10))[0], mode=Mode.SUBTRACT)
    # Esquisse8 → Enlèv. mat.-Extru.4 (cut, up to the surface)
    with BuildSketch(Plane(origin=(-28.396872358, 0, 0), x_dir=(0, 0, -1), z_dir=(1, 0, 0)), mode=Mode.PRIVATE) as enl_v_mat_extru_4_sk3:
        with Locations(Location((10, -5.648351648, 0), (0, 0, 316.465525683))):
            Circle(ESQUISSE8_R)
    enl_v_mat_extru_4_tool3 = split(extrude(enl_v_mat_extru_4_sk3.sketch, amount=ENL_V_MAT_EXTRU_4_REACH, mode=Mode.PRIVATE), bisect_by=enl_v_mat_extru_4_end, keep=Keep.BOTH, mode=Mode.PRIVATE)
    add(enl_v_mat_extru_4_tool3.solids().sort_by_distance((-28.396872, -5.648352, -10))[0], mode=Mode.SUBTRACT)
    # Esquisse8 → Enlèv. mat.-Extru.4 (cut, up to the surface)
    with BuildSketch(Plane(origin=(-28.396872358, 0, 0), x_dir=(0, 0, -1), z_dir=(1, 0, 0)), mode=Mode.PRIVATE) as enl_v_mat_extru_4_sk4:
        with Locations(Location((10, 14.351648352, 0), (0, 0, 316.465525683))):
            Circle(ESQUISSE8_R)
    enl_v_mat_extru_4_tool4 = split(extrude(enl_v_mat_extru_4_sk4.sketch, amount=ENL_V_MAT_EXTRU_4_REACH, mode=Mode.PRIVATE), bisect_by=enl_v_mat_extru_4_end, keep=Keep.BOTH, mode=Mode.PRIVATE)
    add(enl_v_mat_extru_4_tool4.solids().sort_by_distance((-28.396872, 14.351648, -10))[0], mode=Mode.SUBTRACT)

    # Chanfrein2
    chanfrein2_edges = [part.edges().sort_by_distance(p)[0] for p in [
        (4.603127642, -15.648351648, 5),
    ]]
    chanfrein2_side = [part.faces().sort_by_distance(p)[0] for p in [
        (4.603127642, -15.648351648, 24.102624942),
    ]]
    chamfer(chanfrein2_edges, length=CHANFREIN2_SIZE, length2=CHANFREIN2_SIZE2, reference=chanfrein2_side[0])


solid = part.part
